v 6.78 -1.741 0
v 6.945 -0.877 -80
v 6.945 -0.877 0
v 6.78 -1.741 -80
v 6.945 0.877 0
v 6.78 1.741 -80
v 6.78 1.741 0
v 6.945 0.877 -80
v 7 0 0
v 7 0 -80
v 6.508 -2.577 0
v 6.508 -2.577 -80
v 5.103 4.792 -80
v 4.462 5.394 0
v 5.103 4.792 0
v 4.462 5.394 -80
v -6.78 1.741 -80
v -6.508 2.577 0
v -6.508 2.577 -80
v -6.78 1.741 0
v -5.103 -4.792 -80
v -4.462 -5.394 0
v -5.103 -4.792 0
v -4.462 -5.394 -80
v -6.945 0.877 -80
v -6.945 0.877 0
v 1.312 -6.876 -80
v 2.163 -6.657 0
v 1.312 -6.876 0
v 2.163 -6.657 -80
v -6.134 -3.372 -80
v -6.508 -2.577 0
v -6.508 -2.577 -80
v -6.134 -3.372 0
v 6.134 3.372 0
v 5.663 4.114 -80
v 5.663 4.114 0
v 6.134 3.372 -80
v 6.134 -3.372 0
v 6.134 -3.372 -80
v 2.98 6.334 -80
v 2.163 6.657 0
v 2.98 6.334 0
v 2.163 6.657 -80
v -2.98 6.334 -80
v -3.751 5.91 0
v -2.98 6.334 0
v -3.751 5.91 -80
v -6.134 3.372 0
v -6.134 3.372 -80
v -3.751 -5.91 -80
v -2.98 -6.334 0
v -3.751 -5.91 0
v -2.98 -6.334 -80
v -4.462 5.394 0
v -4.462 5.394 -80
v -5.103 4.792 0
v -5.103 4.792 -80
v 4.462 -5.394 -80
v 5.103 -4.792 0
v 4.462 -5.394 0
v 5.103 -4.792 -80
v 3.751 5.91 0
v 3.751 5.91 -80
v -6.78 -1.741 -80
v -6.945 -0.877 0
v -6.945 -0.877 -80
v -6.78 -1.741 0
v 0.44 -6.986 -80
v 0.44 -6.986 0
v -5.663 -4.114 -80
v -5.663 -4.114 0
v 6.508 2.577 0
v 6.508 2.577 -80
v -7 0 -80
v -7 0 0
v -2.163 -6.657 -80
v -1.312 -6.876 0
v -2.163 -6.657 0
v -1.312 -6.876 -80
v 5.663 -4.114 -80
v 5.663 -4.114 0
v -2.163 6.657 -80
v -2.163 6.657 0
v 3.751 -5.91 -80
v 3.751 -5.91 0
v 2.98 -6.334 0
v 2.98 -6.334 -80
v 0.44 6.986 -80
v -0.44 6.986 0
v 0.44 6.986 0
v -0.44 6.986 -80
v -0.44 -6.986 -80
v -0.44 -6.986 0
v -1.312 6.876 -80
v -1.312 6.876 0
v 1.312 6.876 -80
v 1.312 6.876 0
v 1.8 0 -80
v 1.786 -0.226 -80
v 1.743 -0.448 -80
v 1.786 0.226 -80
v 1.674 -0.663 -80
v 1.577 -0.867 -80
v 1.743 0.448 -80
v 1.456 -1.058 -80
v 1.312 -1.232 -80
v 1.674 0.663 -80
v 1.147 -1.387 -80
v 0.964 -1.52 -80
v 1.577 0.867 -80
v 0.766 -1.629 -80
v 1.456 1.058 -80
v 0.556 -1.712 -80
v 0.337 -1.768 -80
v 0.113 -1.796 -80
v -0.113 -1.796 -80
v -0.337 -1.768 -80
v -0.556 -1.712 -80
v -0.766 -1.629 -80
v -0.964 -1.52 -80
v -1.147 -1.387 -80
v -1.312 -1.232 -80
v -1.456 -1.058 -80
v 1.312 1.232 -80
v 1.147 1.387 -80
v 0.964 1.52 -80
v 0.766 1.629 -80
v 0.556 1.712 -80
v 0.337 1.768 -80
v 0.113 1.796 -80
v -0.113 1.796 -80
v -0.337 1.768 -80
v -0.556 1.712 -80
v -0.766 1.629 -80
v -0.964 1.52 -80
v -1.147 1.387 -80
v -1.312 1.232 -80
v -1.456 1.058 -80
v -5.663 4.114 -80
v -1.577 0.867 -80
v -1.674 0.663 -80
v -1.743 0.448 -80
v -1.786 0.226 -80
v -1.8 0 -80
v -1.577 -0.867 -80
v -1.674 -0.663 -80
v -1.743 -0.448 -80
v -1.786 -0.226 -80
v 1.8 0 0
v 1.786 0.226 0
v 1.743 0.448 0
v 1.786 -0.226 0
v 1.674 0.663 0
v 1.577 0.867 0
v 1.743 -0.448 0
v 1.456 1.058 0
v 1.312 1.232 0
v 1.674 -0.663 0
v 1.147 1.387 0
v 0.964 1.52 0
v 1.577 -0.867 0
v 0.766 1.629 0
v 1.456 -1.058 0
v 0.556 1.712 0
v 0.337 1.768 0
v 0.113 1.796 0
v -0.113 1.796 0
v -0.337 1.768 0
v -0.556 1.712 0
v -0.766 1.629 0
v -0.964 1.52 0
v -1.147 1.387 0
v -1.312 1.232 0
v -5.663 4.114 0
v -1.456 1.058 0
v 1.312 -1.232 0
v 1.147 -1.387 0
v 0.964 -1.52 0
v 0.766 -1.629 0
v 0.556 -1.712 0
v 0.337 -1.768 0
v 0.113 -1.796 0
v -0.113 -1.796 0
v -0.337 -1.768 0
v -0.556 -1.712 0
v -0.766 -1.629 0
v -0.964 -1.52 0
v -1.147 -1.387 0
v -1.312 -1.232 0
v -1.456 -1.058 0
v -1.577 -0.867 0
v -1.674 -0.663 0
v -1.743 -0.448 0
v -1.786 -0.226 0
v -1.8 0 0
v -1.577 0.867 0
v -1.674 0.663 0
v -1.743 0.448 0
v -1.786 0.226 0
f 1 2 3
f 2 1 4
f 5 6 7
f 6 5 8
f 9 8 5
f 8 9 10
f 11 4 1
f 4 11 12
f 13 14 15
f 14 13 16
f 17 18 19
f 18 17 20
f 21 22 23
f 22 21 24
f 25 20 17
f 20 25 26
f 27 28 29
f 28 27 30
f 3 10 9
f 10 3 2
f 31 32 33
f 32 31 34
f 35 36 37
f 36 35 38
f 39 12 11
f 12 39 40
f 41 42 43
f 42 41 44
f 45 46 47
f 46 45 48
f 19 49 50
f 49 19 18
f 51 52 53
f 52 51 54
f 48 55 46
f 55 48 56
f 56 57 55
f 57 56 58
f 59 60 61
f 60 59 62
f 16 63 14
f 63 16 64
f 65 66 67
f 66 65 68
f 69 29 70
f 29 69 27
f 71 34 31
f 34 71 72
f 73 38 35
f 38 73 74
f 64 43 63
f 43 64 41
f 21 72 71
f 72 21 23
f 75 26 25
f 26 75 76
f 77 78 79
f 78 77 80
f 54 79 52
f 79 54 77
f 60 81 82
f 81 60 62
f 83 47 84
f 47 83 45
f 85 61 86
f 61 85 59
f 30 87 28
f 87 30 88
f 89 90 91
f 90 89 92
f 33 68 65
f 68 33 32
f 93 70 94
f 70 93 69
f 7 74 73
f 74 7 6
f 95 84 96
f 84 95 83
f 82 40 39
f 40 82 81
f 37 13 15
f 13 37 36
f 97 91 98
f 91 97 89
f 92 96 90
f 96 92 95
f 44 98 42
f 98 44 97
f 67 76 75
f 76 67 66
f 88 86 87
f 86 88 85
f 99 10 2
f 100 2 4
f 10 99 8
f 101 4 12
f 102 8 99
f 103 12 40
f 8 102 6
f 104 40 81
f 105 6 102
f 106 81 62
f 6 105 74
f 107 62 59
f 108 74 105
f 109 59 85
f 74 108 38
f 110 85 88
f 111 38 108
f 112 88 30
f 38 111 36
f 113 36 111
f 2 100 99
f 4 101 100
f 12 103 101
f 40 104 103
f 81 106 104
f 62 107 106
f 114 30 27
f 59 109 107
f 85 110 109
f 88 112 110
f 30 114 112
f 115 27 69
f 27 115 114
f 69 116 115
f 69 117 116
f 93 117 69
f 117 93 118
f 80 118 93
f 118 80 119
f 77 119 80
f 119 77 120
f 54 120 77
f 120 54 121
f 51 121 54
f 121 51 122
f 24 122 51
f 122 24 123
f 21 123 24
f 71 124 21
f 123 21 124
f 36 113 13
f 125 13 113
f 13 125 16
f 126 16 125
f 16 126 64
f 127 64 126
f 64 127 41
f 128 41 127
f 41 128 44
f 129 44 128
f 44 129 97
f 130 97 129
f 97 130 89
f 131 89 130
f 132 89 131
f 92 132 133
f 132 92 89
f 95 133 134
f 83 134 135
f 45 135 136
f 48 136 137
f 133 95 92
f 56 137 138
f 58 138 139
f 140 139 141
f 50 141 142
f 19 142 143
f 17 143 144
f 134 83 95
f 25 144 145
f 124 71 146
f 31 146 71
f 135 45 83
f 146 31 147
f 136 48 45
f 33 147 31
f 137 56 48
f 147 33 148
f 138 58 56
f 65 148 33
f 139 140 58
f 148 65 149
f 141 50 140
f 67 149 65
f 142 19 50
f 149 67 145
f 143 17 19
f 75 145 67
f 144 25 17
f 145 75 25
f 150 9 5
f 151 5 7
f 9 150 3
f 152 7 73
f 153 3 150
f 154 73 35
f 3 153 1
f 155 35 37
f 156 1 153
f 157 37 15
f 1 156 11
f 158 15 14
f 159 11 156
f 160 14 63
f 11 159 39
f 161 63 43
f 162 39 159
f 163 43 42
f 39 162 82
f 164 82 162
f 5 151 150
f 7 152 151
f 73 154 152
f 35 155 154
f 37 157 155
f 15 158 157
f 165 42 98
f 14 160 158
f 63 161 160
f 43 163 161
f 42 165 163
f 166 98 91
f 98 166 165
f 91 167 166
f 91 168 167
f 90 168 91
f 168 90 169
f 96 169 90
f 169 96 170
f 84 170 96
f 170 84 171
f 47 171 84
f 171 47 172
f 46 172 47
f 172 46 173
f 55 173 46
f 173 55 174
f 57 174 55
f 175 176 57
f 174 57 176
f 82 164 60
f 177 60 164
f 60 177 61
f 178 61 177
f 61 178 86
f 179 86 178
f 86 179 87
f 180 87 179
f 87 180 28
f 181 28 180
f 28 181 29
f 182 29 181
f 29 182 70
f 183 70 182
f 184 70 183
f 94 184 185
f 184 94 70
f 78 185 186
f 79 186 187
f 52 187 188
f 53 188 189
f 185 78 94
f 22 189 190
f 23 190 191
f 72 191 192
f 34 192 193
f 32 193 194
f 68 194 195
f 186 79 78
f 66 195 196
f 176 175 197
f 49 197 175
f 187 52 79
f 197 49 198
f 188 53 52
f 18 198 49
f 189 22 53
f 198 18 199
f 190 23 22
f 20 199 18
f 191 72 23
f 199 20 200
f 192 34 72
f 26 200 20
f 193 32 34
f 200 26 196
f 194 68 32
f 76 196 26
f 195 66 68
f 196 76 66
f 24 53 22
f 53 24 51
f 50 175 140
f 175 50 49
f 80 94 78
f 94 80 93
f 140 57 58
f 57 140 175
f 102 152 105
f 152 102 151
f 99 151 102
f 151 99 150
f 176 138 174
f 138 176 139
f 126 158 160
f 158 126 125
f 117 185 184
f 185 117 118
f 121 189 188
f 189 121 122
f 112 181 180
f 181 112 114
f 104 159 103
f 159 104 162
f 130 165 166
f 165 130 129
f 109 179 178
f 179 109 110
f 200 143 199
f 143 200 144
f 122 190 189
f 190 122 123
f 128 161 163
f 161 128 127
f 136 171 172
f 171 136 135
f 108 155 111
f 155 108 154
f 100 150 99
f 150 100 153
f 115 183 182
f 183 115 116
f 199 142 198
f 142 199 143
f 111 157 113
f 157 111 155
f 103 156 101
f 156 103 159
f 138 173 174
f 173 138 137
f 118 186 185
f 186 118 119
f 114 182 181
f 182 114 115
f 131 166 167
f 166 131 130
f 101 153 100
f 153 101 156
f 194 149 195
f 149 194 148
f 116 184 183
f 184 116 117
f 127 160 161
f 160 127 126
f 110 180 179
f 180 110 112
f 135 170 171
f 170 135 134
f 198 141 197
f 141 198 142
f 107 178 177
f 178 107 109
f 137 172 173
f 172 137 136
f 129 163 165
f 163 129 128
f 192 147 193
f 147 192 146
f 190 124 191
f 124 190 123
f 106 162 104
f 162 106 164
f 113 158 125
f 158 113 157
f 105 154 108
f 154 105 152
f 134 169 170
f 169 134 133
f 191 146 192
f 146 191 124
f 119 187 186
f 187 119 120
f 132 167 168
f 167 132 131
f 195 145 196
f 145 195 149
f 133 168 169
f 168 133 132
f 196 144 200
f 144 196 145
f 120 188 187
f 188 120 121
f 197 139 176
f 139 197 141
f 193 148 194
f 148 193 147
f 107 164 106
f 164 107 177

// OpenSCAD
$fn = 50;


difference() {
	union() {
		translate(v = [0, 0, -80.0000000000]) {
			cylinder(h = 80, r = 7.0000000000);
		}
		cylinder(h = 0, r = 16.0000000000);
	}
	union() {
		#translate(v = [0, 0, -80]) {
			cylinder(h = 80, r = 1.8000000000);
		}
	}
}
